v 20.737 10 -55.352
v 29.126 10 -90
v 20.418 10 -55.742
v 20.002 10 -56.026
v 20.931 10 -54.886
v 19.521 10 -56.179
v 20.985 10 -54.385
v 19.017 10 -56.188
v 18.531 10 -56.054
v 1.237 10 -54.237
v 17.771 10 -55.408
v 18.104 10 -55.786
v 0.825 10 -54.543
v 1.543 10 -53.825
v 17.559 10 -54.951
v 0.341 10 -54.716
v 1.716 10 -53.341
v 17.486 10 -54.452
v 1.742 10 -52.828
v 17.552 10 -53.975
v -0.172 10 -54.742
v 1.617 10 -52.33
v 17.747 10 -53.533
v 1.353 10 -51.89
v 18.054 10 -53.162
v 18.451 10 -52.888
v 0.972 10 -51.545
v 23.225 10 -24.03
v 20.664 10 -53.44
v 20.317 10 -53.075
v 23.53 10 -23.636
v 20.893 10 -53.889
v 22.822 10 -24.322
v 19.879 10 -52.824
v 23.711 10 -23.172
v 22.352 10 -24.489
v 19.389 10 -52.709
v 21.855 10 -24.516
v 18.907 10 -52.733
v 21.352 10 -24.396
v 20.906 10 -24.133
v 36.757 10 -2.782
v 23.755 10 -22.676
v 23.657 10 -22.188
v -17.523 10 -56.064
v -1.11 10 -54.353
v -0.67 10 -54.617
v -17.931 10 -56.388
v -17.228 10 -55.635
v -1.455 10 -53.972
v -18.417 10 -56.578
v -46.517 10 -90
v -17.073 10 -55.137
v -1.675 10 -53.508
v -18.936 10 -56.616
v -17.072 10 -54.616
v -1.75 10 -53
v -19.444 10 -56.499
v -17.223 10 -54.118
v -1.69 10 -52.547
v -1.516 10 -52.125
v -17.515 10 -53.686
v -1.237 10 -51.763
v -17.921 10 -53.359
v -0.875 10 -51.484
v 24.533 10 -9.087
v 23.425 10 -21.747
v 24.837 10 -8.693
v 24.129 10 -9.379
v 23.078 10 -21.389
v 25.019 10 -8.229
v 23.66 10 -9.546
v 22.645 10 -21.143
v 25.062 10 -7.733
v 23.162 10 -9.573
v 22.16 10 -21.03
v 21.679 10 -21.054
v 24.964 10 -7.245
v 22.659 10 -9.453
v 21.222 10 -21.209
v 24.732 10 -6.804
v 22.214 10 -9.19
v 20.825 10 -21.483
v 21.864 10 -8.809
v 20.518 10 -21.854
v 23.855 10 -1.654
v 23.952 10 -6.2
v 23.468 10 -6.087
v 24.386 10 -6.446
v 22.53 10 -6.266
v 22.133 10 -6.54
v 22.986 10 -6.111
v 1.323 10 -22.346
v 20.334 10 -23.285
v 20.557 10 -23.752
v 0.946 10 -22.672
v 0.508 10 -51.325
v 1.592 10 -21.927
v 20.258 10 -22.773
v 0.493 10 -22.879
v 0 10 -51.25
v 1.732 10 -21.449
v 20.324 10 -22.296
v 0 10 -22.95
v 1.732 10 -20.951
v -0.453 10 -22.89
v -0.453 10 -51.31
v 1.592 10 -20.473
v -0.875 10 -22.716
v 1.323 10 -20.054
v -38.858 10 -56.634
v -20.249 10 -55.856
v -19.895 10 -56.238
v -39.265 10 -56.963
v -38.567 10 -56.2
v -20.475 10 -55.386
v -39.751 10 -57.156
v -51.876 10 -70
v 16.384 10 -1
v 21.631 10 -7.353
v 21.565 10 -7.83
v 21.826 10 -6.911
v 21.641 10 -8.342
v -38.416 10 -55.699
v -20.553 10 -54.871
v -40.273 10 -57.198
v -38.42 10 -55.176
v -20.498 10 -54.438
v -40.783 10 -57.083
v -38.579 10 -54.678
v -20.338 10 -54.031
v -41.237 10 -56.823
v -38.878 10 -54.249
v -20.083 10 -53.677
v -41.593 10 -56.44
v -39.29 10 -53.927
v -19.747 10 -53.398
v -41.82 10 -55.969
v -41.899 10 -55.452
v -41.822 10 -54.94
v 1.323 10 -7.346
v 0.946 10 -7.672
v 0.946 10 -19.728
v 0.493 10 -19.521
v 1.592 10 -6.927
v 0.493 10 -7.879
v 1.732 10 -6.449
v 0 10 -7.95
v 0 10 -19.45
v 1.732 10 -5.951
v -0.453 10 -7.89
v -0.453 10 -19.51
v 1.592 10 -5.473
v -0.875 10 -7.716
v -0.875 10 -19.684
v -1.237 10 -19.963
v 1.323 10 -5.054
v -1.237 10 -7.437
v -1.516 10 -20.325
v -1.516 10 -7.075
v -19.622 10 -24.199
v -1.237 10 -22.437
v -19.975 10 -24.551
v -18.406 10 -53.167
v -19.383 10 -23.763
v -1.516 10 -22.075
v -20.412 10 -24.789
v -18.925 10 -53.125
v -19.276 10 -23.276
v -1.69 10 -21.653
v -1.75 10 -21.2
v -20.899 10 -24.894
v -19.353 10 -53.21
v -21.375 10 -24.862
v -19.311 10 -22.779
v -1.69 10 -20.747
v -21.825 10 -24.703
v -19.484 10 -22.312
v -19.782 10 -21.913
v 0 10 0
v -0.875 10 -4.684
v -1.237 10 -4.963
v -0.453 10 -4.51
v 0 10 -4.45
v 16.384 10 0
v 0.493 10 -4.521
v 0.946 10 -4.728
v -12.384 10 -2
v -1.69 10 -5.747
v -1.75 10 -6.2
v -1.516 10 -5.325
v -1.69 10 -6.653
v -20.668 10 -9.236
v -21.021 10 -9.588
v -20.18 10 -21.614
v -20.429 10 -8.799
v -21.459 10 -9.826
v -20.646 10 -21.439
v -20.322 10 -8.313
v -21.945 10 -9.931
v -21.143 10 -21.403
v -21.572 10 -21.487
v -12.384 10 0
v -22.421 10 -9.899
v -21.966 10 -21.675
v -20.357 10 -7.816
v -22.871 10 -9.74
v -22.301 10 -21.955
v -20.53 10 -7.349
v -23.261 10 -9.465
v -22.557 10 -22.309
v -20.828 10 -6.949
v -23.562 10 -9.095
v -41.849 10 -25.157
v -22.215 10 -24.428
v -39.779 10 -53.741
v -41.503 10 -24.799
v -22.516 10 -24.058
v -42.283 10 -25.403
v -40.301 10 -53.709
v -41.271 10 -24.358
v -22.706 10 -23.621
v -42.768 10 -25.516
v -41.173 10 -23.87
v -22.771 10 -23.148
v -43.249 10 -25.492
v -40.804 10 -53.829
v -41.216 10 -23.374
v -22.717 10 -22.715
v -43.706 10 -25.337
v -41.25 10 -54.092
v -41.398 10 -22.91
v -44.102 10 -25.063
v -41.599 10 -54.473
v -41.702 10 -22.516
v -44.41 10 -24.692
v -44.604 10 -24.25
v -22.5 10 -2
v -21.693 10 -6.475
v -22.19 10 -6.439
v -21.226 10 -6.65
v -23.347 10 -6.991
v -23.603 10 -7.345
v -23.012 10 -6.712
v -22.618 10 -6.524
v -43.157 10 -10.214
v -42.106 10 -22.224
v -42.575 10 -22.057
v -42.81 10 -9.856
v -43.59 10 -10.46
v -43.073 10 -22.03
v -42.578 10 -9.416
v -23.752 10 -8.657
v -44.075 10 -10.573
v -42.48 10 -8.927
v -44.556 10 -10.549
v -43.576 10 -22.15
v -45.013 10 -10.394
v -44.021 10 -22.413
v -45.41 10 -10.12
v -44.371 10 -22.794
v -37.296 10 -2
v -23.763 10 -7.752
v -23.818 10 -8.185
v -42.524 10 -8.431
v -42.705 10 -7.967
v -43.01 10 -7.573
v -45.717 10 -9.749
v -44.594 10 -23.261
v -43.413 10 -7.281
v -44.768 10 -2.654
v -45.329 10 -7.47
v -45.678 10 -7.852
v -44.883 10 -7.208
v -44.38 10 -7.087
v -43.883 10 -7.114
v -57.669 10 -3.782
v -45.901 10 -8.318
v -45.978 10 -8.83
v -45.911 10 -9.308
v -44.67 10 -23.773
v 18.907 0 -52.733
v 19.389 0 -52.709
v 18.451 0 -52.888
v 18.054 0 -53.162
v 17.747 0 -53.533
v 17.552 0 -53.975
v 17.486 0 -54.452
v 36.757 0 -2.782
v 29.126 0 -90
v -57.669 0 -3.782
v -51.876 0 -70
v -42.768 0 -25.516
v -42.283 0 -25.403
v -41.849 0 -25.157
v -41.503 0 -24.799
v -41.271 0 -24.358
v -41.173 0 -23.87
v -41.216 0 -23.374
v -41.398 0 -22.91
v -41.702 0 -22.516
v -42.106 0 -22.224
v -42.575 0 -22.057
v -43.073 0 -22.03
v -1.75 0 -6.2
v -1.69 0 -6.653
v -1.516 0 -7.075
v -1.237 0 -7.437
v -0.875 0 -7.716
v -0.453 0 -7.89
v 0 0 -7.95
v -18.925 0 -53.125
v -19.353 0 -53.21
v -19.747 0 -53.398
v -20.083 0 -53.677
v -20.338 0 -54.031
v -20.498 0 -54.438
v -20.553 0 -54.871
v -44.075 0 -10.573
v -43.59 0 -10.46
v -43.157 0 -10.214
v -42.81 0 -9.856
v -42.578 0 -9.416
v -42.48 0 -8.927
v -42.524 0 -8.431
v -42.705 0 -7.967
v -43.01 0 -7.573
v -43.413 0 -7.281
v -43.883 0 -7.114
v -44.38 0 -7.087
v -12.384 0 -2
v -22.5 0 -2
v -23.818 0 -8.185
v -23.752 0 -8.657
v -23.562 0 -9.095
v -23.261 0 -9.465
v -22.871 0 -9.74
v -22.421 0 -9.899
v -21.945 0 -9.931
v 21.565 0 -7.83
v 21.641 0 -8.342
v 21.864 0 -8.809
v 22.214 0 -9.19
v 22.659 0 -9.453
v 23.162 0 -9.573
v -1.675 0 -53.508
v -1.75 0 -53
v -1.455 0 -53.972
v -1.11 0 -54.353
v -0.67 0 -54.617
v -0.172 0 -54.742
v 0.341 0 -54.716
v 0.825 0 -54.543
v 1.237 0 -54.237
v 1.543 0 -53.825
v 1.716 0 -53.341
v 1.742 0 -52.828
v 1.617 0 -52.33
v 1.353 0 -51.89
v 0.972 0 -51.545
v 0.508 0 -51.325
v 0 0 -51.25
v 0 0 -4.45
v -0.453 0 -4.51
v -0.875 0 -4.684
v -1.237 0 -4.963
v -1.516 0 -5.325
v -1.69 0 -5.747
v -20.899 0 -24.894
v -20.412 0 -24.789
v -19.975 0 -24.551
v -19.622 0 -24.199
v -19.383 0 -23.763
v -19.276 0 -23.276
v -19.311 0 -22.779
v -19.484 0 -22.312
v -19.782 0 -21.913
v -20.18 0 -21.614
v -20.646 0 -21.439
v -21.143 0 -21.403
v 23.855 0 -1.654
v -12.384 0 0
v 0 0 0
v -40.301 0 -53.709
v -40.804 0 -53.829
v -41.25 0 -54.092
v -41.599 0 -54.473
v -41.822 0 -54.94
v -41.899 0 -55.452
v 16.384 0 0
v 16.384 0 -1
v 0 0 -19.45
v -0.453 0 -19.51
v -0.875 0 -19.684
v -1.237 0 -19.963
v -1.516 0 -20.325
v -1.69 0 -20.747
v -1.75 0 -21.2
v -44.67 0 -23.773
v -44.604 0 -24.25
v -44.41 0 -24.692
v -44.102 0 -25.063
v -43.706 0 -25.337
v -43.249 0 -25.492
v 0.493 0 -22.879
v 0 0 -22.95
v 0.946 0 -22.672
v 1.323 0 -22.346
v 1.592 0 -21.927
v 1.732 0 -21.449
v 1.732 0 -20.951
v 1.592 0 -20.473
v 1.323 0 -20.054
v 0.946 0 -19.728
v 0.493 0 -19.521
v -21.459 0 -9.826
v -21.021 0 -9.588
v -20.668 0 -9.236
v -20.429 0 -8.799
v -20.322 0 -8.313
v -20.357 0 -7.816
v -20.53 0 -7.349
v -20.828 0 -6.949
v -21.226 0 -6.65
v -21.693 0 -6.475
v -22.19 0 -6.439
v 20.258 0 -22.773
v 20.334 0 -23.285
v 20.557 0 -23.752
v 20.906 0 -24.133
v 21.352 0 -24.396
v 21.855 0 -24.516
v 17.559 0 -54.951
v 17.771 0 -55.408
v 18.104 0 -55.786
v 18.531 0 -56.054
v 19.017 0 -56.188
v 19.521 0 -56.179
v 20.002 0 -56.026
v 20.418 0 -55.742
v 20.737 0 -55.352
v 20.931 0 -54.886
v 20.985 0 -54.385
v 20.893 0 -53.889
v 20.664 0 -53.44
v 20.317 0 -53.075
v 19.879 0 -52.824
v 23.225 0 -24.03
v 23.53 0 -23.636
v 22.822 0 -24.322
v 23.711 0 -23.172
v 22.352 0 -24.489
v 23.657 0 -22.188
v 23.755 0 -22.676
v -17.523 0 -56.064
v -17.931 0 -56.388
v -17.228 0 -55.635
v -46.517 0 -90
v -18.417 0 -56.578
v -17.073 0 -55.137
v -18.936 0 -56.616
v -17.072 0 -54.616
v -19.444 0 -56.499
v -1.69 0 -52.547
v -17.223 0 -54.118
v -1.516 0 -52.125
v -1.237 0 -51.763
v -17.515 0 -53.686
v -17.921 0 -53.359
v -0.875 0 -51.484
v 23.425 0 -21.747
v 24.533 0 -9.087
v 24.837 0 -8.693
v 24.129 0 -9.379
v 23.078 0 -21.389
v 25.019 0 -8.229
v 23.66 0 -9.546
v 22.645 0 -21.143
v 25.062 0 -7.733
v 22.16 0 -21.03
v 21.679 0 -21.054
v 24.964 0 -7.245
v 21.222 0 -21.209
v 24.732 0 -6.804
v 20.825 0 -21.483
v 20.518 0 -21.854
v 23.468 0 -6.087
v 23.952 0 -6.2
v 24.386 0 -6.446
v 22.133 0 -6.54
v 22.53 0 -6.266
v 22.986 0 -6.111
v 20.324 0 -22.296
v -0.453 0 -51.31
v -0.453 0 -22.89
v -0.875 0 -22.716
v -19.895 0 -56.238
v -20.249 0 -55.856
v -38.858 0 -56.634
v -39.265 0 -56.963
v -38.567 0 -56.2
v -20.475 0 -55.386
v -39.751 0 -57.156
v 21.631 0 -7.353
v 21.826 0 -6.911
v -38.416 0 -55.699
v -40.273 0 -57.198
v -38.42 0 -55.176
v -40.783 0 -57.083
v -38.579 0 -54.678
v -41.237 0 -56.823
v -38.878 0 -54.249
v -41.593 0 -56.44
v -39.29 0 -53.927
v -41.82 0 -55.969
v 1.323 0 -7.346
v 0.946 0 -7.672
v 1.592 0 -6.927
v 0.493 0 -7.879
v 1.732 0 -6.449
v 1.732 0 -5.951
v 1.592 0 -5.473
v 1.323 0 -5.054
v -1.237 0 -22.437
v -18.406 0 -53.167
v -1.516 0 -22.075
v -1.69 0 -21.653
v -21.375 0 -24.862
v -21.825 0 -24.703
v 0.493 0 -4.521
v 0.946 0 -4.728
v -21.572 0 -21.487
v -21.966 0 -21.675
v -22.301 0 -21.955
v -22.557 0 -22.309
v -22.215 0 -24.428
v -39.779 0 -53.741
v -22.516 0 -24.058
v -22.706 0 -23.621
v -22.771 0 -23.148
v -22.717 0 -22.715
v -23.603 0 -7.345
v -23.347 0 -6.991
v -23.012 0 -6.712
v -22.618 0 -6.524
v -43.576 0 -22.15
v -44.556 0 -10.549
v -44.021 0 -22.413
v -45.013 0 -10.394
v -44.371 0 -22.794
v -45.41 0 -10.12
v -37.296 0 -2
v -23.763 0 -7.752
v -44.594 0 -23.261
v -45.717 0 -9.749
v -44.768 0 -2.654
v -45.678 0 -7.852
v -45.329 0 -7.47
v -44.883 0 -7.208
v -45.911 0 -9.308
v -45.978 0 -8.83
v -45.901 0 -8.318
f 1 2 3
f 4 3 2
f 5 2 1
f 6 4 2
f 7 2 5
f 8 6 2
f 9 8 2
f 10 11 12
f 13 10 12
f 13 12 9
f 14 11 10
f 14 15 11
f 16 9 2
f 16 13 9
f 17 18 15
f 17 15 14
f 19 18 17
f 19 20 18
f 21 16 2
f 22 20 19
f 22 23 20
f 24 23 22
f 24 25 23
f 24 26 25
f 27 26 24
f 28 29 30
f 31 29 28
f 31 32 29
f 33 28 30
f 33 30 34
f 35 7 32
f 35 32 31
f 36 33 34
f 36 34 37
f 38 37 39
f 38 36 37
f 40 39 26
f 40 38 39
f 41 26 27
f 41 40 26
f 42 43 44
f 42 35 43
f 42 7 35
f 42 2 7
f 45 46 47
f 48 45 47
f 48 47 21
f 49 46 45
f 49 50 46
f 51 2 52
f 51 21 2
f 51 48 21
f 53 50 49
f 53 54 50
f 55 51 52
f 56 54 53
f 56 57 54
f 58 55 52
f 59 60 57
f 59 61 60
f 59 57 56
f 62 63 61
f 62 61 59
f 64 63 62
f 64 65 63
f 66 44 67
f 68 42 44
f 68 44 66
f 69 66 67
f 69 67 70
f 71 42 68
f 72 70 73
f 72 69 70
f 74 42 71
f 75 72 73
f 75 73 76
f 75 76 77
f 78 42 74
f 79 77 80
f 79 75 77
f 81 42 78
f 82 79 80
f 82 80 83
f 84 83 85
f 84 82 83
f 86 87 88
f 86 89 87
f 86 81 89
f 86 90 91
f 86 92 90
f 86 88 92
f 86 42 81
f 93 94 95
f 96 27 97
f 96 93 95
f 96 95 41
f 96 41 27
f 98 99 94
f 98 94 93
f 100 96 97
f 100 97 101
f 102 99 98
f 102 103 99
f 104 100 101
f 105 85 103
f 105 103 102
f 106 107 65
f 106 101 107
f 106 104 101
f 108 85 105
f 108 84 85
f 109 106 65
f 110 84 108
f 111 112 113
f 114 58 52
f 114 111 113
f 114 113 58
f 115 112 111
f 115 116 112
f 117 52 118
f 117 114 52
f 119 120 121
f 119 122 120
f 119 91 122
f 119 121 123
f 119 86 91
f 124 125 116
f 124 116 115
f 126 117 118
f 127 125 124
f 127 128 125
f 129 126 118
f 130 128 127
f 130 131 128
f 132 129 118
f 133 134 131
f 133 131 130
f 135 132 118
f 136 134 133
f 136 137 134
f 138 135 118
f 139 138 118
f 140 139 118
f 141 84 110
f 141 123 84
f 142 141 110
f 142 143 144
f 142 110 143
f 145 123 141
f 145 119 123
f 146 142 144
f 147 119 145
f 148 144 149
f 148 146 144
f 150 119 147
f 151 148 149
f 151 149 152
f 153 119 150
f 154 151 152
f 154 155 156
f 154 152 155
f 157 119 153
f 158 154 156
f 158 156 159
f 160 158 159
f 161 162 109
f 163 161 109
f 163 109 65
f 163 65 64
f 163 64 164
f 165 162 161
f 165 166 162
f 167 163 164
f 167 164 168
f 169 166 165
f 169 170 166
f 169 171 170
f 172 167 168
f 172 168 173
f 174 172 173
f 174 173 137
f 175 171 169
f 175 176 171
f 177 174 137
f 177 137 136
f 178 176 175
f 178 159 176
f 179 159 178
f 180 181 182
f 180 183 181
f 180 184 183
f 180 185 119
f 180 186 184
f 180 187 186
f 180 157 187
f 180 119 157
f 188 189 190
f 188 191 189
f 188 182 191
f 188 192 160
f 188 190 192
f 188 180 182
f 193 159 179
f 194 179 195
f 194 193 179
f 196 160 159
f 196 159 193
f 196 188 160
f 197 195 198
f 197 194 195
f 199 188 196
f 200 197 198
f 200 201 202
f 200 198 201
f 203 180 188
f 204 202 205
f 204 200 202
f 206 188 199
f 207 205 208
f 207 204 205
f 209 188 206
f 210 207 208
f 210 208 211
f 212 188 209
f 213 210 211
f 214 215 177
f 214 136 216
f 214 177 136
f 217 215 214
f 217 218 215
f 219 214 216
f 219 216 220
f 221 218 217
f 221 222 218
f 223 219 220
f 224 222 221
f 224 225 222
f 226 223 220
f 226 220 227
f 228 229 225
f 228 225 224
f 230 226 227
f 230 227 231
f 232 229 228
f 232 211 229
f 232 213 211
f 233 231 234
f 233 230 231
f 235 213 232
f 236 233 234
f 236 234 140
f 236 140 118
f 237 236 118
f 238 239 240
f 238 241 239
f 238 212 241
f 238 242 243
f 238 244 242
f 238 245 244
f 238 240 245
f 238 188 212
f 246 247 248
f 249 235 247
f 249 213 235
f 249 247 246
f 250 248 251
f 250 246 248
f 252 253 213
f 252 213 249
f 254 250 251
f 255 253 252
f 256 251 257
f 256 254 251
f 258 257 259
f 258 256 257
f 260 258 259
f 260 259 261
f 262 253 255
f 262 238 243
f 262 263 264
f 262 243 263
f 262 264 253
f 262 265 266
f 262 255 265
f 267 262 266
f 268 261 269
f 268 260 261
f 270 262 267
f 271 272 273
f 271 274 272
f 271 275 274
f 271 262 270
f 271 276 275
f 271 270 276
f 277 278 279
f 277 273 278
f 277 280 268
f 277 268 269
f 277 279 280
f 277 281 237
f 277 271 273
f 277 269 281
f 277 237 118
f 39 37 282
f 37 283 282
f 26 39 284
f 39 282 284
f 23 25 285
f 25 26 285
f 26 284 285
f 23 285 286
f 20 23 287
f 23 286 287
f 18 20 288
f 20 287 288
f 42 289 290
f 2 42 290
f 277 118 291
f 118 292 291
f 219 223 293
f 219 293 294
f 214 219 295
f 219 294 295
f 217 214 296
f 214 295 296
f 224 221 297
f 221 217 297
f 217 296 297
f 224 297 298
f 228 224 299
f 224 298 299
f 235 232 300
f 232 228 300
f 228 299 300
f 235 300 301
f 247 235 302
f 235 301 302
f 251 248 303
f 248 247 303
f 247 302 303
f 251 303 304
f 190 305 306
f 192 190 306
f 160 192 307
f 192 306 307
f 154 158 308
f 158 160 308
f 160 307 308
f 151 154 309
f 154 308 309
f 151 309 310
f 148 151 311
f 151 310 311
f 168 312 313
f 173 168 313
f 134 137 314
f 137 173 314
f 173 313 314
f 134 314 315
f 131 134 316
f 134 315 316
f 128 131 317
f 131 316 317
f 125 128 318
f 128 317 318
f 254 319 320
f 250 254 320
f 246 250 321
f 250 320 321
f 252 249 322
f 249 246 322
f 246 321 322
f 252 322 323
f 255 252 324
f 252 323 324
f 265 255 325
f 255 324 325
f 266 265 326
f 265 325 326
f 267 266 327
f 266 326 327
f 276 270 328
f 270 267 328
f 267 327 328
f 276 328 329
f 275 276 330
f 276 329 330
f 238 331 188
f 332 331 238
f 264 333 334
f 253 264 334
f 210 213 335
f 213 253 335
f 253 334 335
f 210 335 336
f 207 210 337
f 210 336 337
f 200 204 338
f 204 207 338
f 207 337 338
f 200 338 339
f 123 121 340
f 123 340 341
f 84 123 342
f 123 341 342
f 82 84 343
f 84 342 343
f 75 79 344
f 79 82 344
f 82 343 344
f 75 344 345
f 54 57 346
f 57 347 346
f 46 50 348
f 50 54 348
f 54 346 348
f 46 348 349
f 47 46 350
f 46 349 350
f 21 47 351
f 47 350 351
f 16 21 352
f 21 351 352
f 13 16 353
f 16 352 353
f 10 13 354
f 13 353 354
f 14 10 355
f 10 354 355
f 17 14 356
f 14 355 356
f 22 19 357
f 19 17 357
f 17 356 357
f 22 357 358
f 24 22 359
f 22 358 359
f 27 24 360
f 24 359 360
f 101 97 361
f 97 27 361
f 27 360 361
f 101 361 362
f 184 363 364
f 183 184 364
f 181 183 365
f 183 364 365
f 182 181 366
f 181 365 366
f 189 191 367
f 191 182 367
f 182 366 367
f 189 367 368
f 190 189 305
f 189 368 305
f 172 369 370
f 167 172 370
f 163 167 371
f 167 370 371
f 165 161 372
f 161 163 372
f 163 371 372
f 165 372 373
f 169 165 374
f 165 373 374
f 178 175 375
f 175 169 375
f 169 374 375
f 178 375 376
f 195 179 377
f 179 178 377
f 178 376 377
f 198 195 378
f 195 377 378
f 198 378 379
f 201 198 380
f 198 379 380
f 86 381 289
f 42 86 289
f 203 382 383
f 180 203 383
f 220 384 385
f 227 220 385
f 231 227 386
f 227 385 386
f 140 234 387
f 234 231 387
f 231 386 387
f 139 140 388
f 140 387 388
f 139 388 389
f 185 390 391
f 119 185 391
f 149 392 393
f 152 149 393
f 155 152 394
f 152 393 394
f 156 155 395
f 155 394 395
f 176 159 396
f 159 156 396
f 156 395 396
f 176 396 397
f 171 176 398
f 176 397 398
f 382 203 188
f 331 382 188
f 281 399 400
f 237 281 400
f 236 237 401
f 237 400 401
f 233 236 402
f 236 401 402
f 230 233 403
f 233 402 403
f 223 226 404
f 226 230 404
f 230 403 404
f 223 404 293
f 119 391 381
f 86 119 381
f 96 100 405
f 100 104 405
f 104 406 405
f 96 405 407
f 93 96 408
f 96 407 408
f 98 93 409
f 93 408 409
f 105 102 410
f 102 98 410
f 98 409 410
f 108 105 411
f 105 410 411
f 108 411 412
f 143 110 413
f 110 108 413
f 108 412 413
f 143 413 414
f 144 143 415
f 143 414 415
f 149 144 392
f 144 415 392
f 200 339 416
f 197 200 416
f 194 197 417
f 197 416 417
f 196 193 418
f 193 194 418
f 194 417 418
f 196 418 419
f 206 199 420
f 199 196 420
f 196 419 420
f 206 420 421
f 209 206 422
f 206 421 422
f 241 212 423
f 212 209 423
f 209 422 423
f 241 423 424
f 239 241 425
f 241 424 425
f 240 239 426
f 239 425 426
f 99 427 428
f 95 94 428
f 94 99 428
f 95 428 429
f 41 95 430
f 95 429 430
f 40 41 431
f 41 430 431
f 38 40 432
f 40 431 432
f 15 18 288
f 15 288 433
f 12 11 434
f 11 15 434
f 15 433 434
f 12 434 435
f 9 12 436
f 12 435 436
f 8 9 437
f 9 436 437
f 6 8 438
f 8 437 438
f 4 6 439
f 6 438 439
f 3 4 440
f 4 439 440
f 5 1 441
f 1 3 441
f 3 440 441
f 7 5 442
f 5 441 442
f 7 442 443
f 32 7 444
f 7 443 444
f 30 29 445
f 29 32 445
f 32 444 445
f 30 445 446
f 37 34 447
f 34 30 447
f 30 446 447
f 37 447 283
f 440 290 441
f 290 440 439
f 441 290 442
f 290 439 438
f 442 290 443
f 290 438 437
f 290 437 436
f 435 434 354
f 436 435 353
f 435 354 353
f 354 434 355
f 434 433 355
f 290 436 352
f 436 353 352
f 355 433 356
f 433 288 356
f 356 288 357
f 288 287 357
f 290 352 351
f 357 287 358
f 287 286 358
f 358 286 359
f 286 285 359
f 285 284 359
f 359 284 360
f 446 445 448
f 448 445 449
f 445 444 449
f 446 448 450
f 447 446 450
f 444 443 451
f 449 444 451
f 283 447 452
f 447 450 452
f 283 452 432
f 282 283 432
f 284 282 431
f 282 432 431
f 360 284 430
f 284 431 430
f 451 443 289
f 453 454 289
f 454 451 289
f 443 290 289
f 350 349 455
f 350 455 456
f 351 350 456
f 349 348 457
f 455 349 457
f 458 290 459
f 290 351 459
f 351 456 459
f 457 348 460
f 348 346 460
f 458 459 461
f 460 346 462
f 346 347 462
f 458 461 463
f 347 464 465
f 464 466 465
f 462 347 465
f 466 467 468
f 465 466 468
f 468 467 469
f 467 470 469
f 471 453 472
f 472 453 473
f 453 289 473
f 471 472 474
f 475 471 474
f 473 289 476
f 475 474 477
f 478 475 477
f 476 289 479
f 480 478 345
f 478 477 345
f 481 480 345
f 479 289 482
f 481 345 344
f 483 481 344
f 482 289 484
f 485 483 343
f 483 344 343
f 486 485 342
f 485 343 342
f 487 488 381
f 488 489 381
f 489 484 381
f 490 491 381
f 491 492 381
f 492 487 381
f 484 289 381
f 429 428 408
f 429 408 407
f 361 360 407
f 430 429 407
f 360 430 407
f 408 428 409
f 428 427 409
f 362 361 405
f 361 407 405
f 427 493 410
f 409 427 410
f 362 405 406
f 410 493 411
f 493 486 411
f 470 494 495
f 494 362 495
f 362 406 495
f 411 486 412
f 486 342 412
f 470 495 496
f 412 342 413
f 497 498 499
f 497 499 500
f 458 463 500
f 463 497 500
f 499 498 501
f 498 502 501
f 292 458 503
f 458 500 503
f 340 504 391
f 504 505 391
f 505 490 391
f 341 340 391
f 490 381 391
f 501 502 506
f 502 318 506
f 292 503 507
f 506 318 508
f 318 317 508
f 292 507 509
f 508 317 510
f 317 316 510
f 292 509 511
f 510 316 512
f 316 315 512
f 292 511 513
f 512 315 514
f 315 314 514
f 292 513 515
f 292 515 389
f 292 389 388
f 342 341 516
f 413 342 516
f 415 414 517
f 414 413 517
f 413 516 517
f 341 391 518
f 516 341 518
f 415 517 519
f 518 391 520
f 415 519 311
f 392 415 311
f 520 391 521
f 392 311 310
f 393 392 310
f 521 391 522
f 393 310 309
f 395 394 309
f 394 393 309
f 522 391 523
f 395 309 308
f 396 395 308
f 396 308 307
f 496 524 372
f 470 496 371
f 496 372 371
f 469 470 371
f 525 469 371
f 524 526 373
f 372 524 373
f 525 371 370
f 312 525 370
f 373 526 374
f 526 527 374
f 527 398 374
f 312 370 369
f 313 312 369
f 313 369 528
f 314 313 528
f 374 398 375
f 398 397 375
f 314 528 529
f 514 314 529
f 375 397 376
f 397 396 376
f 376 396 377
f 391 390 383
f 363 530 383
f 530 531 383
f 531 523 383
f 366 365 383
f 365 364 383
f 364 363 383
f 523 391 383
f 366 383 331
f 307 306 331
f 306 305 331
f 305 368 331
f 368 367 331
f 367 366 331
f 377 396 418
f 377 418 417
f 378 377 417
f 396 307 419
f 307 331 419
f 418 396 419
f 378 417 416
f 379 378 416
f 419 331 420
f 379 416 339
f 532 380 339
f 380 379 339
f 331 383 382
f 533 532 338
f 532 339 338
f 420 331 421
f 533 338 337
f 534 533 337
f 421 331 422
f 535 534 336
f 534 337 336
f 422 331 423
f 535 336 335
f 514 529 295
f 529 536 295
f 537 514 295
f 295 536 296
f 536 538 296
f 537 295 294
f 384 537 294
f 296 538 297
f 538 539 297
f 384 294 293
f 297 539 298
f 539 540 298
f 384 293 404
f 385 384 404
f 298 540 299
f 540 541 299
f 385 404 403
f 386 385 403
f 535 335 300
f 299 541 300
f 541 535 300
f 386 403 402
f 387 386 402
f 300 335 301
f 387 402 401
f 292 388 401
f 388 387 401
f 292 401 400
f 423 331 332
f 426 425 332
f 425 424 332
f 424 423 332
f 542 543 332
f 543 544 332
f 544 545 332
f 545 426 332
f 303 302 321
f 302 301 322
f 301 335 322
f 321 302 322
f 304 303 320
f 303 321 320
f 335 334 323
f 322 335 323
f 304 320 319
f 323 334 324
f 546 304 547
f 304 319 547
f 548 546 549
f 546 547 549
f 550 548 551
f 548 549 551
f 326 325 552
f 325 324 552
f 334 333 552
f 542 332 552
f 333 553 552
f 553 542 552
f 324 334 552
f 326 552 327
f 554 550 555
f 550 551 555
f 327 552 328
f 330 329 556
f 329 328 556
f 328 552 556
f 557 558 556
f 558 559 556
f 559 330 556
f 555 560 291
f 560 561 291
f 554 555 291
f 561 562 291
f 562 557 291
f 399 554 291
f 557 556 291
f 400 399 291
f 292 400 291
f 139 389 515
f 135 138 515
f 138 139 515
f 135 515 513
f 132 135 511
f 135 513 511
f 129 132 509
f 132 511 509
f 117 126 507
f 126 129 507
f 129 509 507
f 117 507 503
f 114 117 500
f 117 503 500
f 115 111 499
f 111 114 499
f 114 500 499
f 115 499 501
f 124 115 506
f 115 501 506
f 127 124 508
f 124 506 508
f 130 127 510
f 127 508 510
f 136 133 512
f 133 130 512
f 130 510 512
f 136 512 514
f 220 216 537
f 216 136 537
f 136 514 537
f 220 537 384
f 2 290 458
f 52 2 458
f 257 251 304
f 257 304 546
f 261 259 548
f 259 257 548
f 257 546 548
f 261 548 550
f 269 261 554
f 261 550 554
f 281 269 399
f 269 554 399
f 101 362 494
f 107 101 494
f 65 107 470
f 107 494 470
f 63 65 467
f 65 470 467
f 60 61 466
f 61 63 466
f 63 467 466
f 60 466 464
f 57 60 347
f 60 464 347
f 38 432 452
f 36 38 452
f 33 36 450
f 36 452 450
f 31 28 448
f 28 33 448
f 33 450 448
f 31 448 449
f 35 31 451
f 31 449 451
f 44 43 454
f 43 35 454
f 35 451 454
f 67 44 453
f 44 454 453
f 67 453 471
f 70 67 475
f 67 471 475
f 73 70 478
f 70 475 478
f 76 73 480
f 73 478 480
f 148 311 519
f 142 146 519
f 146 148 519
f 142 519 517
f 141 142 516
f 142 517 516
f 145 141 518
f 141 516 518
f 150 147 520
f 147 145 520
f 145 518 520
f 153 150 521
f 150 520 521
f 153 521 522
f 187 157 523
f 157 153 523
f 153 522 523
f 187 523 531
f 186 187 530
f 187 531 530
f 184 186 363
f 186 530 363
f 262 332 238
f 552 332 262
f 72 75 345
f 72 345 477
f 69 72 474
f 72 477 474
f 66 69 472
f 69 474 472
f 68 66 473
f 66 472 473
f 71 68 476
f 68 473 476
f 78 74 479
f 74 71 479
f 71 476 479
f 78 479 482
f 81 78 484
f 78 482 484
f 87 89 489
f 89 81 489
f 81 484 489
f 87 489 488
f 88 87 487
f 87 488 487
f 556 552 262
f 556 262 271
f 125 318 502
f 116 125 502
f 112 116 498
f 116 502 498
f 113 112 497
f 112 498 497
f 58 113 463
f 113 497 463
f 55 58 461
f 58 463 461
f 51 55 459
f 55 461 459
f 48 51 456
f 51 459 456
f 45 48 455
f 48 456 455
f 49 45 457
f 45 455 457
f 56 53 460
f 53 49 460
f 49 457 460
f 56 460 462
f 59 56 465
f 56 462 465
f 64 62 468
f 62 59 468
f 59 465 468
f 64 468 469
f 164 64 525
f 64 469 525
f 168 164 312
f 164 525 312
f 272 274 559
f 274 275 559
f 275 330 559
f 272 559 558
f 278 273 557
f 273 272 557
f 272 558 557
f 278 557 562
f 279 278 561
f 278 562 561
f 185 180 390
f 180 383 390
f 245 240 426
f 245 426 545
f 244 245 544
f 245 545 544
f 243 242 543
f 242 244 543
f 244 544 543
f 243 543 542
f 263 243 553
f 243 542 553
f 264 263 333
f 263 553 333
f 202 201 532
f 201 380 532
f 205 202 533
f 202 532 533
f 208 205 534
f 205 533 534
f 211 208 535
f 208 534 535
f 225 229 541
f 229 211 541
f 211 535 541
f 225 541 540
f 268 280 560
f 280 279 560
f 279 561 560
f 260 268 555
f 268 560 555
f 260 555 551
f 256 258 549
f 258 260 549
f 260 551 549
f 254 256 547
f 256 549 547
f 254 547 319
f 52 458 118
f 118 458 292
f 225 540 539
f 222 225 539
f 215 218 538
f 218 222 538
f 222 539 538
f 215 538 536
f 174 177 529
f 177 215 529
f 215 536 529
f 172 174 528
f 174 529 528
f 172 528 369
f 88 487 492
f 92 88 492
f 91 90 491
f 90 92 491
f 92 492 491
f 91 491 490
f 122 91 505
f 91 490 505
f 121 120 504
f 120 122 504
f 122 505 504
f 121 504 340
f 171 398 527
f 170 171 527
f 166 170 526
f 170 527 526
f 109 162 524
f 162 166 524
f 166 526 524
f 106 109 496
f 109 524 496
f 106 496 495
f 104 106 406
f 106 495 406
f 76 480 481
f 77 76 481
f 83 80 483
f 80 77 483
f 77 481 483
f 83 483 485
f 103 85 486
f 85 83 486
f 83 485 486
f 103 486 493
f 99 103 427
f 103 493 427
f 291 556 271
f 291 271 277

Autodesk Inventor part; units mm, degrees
ref_plane "YZ Plane" through (0, 0, 0) normal (1, 0, 0) x (0, 1, 0)
ref_plane "XZ Plane" through (0, 0, 0) normal (0, 1, 0) x (-1, 0, 0)
sketch "Sketch1" plane through (0, 0, 0) normal (0, 1, 0) x (-1, 0, 0)
  line L0 (77, 0) -> (-56, 0) projected
  line L1 (0, -111.5403) -> (0, 39.2421) construction
  line L2 (58, 0) -> (-37, 0) construction
  line L3 (-37, 0) -> (-29.126, -90)
  line L4 (-29.126, -90) -> (46.5168, -90)
  line L5 (46.5168, -90) -> (51.8758, -70)
  line L6 (51.8758, -70) -> (58, 0)
  line L7 (0, -90) -> (0, -90) construction
  line L8 (-16.126, -90) -> (-24.0526, 0.6013) construction
  line L9 (37.126, -90) -> (46.4907, 17.039) construction
  circle A0 centre (44.2275, -8.8301) radius 1.75
  circle A1 centre (22.0675, -8.1849) radius 1.75
  circle A2 centre (0, -6.2) radius 1.75
  circle A3 centre (-23.315, -7.8301) radius 1.75
  circle A4 centre (42.9201, -23.773) radius 1.75
  circle A5 centre (21.0212, -23.1484) radius 1.75
  circle A6 centre (0, -21.2) radius 1.75
  circle A7 centre (-22.0076, -22.773) radius 1.75
  circle A8 centre (40.1486, -55.452) radius 1.75
  circle A9 centre (18.8029, -54.8709) radius 1.75
  circle A10 centre (0, -53) radius 1.75
  circle A11 centre (-19.2361, -54.452) radius 1.75
  line L10 (44.2275, -8.8301) -> (42.9201, -23.773)
  line L11 (22.0675, -8.1849) -> (21.0212, -23.1484)
  line L12 (0, -21.2) -> (0, -6.2)
  line L13 (-22.0076, -22.773) -> (-23.315, -7.8301)
  line L14 (42.9201, -23.773) -> (40.1486, -55.452)
  line L15 (0, -21.2) -> (0, -53)
  line L16 (-19.2361, -54.452) -> (-22.0076, -22.773)
  line L17 (21.0212, -23.1484) -> (18.8029, -54.8709)
  line L18 (12.3839, 0) -> (-16.3839, 0)
  line L19 (-16.3839, 0) -> (-16.3839, -1)
  line L20 (-16.3839, -1) -> (-36.7566, -2.7824)
  line L21 (12.3839, 0) -> (12.3839, -2)
  line L22 (12.3839, -2) -> (37.2964, -2)
  line L23 (37.2964, -2) -> (57.6691, -3.7824)
  line L24 (0, -6.2) -> (0, 0)
  line L25 (22.0675, -8.1849) -> (22.5, -2)
  line L26 (44.2275, -8.8301) -> (44.7678, -2.6537)
  line L27 (-23.315, -7.8301) -> (-23.8553, -1.6537)
  line L28 (16.3464, -90) -> (23.8777, 17.7017) construction
  point P0 (-24, 0)
  point P1 (25, 0)
  point P2 (45, 0)
  dimension "d0" = 95
  dimension "d1" = 37
  dimension "d2" = 24
  dimension "d3" = 25
  dimension "d4" = 45
  dimension "d5" = 5
  dimension "d7" = 5
  dimension "d8" = 105
  dimension "d9" = 20
  dimension "d10" = 90
  dimension "d11" = 3.5
  dimension "d12" = 31.8
  dimension "d13" = 15
  dimension "d14" = 2
  dimension "d15" = 1
  dimension "d16" = 7.5
  dimension "d18" = 7.5
  dimension "d19" = 6.2
  dimension "d22" = 4
  dimension "d23" = 22.5
extrude "Extrusion1" add sketch "Sketch1" along normal blind 10 contours L21 L22 L23 L6 L5 L4 L3 L20 L19 L0
ref_plane "Work Plane1" through (-22.5, 0, -2) normal (-0.0697565, 0, 0.9975641) x (0, -1, 0)
properties part number "empty"
